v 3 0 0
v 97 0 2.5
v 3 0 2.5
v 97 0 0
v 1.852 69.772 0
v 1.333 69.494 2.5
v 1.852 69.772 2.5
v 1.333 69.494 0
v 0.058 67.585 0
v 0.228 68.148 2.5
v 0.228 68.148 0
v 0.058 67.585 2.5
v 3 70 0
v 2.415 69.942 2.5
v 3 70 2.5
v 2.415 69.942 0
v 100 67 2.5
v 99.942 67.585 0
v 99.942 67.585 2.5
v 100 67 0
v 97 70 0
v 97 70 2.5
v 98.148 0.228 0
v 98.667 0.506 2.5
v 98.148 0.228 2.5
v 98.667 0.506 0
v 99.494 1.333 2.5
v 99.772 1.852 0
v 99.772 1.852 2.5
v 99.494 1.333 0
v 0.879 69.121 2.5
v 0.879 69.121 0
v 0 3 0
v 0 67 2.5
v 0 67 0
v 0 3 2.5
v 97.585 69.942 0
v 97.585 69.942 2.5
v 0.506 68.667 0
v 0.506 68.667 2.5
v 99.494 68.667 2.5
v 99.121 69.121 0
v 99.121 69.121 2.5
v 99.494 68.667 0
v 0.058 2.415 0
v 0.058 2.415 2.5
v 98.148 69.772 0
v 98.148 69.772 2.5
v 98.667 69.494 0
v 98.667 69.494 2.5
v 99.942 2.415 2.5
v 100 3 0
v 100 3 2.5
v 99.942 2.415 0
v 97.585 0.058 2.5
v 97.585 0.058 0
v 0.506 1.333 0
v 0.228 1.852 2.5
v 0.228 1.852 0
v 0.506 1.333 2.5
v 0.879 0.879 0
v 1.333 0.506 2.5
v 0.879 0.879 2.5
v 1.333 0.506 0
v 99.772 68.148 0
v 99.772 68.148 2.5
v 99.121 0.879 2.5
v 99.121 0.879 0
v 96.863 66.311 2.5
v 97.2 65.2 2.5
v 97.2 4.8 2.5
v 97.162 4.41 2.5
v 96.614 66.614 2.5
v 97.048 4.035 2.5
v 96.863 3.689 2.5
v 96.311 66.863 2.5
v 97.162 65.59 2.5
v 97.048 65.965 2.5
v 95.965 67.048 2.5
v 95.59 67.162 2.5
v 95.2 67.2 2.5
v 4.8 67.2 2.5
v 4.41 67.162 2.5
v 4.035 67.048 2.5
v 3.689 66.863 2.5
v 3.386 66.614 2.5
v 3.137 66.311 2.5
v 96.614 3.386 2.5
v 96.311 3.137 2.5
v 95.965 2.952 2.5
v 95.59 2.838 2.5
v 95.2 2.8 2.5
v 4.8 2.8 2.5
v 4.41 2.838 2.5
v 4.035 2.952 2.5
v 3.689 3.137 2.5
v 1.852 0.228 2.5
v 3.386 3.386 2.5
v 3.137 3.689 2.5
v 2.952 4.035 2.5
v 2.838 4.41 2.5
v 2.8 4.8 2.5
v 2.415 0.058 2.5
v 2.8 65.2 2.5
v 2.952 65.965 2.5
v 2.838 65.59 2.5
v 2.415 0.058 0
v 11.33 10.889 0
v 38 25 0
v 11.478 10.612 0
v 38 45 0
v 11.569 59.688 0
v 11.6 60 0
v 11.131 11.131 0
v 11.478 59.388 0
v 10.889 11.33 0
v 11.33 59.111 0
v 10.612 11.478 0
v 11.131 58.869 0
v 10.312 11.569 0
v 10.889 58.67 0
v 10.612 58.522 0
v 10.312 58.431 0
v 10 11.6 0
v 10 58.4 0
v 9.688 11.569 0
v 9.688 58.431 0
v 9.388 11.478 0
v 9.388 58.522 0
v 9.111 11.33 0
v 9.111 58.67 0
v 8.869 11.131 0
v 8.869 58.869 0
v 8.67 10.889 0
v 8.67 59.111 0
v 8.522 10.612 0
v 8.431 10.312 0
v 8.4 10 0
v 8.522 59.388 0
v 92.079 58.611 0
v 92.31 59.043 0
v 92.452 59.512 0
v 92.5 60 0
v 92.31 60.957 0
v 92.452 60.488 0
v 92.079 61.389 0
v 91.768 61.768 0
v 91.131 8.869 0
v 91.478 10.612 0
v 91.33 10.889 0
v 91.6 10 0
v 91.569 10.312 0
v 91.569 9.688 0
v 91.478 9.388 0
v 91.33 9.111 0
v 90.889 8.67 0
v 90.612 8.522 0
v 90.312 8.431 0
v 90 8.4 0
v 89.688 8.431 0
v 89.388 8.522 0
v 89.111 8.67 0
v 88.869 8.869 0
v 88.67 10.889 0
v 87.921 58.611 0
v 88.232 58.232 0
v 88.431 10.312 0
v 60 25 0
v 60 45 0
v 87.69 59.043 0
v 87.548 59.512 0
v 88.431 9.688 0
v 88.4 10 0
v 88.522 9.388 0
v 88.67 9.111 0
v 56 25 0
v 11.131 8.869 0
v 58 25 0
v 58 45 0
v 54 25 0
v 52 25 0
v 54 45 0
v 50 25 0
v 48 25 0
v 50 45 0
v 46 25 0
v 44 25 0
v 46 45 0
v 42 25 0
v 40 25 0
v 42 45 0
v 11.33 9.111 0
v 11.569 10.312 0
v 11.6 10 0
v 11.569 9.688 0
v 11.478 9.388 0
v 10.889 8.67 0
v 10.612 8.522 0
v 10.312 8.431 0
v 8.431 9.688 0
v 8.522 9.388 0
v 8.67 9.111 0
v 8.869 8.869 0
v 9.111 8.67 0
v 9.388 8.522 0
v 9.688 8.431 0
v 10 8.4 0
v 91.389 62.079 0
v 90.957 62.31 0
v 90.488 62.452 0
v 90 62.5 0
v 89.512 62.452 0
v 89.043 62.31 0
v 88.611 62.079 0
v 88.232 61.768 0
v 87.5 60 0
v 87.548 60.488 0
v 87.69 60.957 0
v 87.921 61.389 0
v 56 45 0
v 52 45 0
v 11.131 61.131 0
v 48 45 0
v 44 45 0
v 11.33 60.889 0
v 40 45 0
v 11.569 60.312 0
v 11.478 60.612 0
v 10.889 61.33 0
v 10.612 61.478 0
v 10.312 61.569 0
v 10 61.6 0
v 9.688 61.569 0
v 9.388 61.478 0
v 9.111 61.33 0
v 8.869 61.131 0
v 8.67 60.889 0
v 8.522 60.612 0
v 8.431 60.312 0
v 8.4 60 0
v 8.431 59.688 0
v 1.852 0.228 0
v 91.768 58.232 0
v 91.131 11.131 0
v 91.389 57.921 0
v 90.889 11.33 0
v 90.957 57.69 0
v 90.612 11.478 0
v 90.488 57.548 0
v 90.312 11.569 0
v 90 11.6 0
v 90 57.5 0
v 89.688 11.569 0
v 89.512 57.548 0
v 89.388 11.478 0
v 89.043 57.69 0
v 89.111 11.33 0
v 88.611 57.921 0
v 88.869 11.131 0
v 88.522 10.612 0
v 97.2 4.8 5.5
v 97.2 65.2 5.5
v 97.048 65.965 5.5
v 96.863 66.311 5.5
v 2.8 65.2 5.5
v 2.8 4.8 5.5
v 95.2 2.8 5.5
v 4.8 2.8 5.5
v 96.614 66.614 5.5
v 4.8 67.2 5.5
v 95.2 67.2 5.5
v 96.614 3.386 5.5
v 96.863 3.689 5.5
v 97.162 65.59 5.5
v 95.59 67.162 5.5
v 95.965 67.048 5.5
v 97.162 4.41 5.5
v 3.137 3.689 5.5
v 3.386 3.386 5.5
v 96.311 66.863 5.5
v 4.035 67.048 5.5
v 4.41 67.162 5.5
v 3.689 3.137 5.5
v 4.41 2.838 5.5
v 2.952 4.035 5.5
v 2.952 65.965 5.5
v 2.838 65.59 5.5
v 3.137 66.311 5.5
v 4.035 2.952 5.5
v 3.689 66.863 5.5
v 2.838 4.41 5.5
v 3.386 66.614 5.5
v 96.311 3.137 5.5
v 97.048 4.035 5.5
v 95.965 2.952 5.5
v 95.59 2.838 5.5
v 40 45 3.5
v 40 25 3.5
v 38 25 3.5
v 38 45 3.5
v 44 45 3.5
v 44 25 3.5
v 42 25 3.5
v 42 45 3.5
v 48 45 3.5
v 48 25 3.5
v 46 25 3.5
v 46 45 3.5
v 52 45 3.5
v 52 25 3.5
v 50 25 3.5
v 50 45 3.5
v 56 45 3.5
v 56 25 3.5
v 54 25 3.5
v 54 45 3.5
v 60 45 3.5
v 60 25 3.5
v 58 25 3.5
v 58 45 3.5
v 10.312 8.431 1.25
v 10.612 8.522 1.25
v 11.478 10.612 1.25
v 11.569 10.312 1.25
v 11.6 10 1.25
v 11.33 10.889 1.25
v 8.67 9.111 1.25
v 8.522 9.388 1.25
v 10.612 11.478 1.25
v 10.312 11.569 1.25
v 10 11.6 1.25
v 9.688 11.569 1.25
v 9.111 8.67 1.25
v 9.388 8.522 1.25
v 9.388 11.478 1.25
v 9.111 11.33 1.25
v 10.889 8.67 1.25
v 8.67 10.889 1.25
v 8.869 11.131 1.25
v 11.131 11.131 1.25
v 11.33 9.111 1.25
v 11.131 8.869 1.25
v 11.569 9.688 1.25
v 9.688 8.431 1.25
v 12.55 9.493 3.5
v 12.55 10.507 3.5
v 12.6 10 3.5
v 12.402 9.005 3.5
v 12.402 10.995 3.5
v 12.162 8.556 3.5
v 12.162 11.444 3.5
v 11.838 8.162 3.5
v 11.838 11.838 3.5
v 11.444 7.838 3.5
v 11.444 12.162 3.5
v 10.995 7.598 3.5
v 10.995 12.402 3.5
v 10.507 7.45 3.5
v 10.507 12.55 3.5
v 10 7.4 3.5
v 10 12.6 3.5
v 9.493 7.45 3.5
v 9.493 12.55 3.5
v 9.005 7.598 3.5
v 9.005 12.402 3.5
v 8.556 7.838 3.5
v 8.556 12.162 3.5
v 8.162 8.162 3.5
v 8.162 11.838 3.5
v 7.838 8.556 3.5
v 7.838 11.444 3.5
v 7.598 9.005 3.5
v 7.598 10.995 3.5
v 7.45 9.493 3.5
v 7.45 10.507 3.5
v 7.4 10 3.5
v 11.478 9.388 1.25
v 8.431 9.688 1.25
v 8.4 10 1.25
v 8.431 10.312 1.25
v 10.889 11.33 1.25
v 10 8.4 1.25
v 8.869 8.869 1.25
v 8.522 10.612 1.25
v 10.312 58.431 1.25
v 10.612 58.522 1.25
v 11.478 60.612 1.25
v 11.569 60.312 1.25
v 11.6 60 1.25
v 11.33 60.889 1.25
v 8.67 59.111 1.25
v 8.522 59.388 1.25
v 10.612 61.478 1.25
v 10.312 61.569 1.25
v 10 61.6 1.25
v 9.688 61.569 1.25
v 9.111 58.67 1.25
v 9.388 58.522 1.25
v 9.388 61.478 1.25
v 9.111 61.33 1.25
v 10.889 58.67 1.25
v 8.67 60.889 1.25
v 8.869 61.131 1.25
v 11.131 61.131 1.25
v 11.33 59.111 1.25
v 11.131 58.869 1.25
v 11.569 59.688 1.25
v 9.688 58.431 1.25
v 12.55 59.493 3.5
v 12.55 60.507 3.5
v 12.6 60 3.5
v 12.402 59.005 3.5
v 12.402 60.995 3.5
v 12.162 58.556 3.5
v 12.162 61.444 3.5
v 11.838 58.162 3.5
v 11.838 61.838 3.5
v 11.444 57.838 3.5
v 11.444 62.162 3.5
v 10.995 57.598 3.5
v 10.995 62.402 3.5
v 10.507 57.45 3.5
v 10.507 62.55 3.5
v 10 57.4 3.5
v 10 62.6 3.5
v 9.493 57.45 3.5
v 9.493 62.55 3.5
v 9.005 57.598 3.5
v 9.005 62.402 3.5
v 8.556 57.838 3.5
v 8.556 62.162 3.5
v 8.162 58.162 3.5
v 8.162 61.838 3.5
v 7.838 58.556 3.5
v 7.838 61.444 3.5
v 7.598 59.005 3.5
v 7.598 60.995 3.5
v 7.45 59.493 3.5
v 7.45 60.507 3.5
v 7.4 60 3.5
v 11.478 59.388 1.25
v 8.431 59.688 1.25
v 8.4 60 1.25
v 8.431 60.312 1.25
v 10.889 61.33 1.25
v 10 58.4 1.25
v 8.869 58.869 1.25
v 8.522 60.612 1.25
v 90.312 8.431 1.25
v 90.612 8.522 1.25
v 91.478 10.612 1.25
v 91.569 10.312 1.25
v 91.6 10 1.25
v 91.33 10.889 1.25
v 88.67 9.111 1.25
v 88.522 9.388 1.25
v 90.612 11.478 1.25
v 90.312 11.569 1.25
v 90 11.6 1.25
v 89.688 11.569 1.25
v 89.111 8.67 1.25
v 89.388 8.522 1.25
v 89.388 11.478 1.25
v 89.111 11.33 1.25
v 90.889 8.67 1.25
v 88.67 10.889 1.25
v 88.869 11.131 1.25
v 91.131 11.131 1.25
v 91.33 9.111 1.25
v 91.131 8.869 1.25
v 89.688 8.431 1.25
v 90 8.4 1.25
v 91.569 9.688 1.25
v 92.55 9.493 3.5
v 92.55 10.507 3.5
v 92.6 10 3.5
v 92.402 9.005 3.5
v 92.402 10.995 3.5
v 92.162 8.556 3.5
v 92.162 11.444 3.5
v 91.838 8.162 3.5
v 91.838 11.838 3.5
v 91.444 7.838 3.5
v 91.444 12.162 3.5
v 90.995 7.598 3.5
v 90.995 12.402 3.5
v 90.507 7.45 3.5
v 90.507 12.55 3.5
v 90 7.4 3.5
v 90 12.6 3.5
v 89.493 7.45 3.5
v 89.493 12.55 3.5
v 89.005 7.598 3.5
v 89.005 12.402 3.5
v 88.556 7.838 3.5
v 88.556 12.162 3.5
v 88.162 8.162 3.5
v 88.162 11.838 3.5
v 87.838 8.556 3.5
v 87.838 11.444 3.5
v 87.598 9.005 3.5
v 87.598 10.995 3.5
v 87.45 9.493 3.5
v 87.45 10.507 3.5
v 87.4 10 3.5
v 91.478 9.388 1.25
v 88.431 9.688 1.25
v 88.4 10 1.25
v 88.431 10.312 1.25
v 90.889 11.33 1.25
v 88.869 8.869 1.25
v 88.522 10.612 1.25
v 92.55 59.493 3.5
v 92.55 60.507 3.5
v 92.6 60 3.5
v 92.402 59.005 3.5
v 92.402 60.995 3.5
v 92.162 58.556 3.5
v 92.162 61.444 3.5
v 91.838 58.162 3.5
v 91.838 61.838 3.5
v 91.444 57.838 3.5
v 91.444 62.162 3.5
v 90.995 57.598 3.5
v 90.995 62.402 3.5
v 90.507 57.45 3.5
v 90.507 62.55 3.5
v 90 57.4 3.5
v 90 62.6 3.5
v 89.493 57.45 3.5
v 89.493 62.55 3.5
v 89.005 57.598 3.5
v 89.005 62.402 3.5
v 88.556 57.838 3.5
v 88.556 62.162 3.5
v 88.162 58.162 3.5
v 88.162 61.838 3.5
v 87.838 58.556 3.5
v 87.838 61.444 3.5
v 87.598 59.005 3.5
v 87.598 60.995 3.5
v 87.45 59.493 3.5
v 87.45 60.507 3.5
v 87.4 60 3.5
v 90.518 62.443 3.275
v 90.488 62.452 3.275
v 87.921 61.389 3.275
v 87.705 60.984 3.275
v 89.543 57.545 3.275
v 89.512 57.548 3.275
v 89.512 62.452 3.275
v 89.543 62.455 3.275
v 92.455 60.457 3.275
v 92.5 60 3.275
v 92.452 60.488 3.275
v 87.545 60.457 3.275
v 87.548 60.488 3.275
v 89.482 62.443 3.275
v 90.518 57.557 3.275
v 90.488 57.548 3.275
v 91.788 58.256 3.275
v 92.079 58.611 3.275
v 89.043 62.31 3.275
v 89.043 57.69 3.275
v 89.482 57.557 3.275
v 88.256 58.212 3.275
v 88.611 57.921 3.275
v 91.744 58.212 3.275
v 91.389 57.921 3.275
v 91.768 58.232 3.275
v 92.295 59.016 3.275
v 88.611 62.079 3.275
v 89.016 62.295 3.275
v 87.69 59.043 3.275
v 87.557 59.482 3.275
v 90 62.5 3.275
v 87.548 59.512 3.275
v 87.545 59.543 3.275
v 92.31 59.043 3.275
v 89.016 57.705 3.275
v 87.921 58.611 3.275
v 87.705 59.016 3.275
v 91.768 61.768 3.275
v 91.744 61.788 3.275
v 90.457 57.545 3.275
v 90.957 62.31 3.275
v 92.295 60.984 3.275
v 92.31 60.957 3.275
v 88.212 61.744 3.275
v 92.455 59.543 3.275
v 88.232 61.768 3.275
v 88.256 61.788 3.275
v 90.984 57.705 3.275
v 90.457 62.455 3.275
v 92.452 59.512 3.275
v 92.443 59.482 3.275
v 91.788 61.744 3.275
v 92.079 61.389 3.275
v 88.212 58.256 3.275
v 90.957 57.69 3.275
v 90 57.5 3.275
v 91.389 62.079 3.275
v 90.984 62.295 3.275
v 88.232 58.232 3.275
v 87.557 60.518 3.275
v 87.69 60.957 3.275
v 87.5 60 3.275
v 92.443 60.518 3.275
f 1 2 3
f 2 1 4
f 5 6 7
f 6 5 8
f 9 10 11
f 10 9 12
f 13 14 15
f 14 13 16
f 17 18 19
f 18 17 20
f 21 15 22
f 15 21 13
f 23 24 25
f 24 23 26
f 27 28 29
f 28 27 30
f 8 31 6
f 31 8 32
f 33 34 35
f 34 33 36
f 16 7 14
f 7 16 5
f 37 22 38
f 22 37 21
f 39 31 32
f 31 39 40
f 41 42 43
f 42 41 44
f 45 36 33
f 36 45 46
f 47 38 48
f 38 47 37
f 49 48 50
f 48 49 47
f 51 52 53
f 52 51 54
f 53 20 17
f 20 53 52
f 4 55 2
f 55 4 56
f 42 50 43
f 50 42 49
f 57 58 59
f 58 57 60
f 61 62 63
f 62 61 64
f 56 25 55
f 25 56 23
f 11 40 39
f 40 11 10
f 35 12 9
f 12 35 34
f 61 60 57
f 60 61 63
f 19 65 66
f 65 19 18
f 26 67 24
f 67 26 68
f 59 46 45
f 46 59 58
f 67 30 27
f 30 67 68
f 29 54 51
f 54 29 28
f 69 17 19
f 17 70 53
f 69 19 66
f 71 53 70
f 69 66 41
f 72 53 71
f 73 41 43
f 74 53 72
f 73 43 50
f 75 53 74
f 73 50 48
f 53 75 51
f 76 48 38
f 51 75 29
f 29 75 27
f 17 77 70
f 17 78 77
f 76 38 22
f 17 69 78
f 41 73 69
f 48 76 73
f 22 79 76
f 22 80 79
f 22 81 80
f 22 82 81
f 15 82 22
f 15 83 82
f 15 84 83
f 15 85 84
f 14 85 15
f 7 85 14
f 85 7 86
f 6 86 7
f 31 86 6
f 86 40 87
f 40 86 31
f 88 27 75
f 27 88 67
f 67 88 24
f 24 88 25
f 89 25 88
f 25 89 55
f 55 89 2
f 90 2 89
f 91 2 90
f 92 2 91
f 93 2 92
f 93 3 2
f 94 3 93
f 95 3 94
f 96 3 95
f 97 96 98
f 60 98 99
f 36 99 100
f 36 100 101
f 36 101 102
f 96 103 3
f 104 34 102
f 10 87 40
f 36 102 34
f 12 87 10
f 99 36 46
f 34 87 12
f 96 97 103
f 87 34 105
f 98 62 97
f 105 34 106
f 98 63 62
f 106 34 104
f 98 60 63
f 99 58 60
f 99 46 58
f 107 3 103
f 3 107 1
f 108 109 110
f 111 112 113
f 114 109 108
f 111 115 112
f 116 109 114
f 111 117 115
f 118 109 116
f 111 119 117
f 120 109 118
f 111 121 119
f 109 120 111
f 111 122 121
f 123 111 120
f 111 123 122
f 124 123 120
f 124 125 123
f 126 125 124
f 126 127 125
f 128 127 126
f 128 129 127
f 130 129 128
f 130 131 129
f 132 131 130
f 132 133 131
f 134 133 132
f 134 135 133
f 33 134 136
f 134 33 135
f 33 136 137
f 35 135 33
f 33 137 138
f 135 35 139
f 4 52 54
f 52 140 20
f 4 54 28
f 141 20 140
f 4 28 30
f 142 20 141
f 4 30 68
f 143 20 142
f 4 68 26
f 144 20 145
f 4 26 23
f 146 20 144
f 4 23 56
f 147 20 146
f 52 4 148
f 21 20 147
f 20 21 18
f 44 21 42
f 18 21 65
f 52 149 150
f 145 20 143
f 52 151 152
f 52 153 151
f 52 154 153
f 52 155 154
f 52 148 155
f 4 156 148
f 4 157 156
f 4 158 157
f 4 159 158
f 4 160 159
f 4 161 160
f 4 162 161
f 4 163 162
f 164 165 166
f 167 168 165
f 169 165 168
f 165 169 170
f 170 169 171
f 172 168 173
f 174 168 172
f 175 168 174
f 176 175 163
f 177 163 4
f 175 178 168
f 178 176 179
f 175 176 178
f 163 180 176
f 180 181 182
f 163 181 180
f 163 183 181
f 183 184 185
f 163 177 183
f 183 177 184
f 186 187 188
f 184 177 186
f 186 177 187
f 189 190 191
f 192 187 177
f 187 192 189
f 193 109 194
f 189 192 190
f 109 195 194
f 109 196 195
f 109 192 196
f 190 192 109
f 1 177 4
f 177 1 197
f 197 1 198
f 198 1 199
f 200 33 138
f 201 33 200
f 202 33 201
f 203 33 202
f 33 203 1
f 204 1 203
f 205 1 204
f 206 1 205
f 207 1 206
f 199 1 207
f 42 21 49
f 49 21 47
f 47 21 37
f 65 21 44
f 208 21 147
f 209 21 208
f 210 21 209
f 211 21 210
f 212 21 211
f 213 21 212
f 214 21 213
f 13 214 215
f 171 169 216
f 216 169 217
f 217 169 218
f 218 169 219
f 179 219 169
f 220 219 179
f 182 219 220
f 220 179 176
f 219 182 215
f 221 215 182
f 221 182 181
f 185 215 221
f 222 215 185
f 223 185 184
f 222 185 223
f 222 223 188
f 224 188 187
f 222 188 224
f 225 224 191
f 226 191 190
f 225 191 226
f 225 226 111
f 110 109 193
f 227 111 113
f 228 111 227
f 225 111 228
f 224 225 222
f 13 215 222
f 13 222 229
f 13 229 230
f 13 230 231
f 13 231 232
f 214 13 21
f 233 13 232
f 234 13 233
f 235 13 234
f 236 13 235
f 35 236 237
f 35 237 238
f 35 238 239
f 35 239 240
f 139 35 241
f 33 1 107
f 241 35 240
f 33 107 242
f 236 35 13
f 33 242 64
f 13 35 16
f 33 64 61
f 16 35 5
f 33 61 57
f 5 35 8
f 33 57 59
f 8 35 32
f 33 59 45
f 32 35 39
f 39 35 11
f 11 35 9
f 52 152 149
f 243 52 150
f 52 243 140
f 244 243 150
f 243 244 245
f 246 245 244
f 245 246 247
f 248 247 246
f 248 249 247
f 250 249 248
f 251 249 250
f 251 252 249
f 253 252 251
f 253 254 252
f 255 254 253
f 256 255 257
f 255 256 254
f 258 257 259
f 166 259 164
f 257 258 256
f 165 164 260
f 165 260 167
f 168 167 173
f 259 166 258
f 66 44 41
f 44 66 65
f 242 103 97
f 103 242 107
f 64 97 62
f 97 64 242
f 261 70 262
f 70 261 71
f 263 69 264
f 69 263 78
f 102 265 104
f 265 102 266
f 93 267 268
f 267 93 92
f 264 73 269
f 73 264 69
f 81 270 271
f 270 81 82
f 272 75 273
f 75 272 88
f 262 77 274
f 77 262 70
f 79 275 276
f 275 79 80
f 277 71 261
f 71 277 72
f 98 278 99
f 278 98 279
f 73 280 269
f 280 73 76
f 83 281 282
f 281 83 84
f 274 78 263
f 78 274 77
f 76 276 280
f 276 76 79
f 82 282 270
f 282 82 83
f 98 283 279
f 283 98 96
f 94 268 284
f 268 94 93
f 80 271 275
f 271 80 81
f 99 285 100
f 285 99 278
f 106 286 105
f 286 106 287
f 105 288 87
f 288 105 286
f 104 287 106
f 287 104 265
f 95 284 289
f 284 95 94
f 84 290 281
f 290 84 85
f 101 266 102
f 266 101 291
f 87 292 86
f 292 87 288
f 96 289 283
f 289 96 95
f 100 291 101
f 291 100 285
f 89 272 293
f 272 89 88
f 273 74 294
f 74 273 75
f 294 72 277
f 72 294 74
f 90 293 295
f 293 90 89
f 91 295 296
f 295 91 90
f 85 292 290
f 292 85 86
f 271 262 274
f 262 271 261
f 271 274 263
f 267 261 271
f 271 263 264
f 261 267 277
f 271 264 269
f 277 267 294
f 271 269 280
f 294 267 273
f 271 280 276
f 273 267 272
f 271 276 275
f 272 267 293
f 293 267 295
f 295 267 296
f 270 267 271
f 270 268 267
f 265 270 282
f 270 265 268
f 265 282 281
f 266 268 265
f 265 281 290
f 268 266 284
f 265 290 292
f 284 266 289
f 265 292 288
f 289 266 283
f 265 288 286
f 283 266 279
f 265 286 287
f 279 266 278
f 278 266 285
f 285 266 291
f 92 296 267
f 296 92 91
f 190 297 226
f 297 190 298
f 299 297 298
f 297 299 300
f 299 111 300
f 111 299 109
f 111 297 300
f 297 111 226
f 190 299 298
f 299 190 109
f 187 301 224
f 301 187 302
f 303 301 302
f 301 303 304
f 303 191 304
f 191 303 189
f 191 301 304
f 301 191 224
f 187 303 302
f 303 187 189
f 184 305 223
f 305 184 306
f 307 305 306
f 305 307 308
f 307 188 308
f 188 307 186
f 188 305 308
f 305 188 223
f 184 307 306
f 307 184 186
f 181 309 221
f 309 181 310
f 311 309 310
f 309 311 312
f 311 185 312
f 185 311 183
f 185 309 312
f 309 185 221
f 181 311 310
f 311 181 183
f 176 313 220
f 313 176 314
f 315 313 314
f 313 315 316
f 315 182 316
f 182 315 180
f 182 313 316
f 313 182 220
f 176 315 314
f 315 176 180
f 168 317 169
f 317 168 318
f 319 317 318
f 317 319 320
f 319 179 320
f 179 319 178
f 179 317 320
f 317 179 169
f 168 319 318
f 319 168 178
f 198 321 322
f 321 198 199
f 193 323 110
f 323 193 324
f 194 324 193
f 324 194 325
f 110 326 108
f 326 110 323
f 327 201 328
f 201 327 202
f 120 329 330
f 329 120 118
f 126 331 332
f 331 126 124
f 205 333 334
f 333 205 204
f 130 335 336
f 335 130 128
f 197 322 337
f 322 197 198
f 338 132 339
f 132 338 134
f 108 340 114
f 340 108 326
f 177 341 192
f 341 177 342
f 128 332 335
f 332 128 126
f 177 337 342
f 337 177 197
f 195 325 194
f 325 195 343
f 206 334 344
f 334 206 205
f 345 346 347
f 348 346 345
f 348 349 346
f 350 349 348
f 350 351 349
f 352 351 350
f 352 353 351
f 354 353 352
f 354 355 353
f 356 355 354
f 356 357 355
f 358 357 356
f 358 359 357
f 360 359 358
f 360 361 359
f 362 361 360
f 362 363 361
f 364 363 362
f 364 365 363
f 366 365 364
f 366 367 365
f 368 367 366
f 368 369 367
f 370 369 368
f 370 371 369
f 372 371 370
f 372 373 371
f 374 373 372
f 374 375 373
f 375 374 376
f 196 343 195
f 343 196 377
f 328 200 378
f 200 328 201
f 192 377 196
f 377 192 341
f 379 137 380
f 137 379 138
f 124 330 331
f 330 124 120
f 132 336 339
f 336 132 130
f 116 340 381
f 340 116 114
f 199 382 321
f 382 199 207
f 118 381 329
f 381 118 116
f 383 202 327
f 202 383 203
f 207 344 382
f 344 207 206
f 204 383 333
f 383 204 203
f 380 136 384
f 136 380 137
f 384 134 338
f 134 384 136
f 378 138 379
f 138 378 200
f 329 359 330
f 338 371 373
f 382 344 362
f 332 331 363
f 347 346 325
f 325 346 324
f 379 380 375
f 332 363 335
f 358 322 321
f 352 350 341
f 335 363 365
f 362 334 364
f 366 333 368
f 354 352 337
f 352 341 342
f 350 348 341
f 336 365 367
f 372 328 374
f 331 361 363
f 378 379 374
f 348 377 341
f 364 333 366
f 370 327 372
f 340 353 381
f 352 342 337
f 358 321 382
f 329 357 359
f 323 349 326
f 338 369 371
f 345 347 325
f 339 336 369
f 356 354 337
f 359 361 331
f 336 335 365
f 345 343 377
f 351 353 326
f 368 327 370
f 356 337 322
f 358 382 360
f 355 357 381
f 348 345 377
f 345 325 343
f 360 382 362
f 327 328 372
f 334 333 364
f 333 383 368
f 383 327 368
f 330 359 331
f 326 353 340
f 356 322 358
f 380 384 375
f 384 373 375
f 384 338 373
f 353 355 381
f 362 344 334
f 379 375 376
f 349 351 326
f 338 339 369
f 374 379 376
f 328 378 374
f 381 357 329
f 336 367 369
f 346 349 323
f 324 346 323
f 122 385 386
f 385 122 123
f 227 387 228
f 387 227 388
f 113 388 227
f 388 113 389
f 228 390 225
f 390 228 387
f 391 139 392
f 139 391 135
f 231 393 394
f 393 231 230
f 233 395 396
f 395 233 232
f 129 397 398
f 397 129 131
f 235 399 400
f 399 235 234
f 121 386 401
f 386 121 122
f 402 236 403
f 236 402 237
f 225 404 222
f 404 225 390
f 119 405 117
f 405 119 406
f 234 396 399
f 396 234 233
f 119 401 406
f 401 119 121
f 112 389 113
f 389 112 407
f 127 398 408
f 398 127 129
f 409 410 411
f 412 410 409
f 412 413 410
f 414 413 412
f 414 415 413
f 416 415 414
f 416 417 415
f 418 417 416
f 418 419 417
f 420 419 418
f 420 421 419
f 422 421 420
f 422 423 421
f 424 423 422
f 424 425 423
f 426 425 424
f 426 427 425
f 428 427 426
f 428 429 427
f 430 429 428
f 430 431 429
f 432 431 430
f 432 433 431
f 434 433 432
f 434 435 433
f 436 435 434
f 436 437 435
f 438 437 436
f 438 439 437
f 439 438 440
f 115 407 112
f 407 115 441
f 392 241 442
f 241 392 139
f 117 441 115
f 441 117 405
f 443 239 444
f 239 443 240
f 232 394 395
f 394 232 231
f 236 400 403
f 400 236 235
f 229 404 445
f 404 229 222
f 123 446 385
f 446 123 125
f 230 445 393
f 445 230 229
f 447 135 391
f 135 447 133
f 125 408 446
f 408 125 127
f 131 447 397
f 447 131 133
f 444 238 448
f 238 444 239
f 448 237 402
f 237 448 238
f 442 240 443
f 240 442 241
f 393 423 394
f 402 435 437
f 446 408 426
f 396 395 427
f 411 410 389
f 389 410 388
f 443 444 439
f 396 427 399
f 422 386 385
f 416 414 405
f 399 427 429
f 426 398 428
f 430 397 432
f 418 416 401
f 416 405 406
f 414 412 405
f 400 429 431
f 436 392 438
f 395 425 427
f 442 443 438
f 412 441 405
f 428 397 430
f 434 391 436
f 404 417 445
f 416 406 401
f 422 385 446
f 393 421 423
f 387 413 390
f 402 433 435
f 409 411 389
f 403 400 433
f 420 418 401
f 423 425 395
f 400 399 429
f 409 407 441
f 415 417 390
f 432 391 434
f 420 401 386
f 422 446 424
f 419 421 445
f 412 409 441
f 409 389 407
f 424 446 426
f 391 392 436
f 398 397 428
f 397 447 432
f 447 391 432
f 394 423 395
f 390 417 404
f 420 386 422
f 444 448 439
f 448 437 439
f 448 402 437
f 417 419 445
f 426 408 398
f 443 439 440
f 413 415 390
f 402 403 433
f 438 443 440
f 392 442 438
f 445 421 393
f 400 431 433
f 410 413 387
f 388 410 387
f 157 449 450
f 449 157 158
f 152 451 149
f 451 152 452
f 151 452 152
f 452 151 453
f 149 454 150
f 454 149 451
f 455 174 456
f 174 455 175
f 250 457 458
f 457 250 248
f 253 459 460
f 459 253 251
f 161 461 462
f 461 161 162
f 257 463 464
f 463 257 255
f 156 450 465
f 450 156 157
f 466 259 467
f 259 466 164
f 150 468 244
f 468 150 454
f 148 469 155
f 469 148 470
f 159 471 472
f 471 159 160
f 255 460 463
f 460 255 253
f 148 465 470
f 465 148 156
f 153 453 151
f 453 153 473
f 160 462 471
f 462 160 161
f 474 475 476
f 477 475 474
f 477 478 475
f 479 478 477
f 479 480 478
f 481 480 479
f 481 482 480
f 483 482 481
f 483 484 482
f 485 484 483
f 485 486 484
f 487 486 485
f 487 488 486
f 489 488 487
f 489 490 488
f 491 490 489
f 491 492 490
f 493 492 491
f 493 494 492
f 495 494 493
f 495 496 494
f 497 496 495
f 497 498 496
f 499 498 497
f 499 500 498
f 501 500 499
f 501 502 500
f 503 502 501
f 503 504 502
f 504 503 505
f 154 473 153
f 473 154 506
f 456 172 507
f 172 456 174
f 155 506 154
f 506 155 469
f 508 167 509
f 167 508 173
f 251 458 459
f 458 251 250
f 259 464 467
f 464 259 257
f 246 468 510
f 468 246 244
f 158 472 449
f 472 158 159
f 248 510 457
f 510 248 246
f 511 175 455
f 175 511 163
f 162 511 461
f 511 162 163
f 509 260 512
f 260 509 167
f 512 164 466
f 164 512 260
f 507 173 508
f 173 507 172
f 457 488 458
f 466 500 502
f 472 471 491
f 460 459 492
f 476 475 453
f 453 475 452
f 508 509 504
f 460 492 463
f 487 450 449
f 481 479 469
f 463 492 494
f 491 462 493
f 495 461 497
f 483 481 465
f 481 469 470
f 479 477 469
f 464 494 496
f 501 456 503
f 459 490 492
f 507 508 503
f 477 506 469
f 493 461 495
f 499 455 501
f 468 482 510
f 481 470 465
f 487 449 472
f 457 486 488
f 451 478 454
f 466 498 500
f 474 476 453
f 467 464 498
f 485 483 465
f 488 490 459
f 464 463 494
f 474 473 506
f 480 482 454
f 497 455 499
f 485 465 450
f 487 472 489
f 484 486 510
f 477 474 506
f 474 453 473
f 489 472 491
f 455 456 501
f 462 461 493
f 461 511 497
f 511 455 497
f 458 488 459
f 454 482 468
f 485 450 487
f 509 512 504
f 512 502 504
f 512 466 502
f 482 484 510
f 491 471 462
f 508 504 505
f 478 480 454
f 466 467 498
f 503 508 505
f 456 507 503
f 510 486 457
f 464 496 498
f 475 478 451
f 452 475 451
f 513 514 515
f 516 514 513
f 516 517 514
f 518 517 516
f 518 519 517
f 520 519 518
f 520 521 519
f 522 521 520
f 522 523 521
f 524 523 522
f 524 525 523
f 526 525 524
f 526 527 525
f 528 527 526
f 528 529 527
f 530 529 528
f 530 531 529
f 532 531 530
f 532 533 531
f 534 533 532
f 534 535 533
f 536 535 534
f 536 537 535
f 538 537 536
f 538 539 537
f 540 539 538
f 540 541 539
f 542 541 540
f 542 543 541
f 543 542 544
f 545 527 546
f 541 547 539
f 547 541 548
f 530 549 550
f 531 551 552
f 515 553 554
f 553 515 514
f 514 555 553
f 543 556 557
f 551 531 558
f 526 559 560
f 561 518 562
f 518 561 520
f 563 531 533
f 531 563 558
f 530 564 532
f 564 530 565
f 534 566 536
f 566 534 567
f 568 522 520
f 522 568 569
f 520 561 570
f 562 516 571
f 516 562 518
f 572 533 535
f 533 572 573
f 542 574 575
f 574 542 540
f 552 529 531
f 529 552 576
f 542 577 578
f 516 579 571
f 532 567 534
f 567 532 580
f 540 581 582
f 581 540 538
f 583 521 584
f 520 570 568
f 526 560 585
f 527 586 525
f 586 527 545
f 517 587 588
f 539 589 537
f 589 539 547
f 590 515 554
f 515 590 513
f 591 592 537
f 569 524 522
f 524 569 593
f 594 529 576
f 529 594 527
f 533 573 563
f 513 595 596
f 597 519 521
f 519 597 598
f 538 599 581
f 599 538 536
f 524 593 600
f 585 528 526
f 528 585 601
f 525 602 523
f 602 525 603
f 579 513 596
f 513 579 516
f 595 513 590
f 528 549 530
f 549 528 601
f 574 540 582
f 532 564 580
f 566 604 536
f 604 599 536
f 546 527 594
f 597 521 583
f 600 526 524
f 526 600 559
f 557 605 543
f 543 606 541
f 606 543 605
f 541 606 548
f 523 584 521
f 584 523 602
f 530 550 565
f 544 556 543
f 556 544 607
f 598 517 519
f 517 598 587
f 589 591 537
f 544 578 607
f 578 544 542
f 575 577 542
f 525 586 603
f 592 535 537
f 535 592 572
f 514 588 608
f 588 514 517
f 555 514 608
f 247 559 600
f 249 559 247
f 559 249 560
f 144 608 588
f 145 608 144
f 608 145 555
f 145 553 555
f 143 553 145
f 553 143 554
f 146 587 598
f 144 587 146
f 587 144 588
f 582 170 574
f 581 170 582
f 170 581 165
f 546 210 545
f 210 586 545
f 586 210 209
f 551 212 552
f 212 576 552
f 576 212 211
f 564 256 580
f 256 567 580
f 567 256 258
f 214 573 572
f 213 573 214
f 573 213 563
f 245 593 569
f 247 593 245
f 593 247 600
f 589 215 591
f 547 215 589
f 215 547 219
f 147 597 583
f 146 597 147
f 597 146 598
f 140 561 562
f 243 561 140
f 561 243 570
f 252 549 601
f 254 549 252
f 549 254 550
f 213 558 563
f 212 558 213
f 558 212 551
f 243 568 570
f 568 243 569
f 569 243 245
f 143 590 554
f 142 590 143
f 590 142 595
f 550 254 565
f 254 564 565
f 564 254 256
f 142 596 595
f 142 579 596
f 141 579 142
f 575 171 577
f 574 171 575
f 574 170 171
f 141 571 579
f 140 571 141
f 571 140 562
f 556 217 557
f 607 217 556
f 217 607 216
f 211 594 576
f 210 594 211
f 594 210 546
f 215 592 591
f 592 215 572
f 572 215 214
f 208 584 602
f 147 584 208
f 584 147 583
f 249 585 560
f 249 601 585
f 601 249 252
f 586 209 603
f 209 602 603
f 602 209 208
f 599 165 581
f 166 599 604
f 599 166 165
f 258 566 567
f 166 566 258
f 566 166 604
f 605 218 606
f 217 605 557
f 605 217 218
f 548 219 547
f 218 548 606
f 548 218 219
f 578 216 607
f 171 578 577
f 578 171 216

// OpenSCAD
/*
 * ESP32 Battery Monitor Enclosure - LID PART
 * 
 * OpenSCAD script to generate 3D printable enclosure lid
 * 
 * To use:
 * 1. Install OpenSCAD (free): https://openscad.org/
 * 2. Open this file in OpenSCAD
 * 3. Press F5 to preview
 * 4. Press F6 to render
 * 5. File > Export > Export as STL
 * 
 * Print settings:
 * - Layer height: 0.2mm
 * - Infill: 20%
 * - Supports: No
 * - Material: PLA or PETG
 */

// ============================================================================
// Configuration Parameters (adjust as needed)
// ============================================================================

// Box dimensions (in mm) - MUST MATCH BOTTOM PART
box_length = 100;      // X dimension
box_width = 70;        // Y dimension
box_height = 40;       // Z dimension (total height)
wall_thickness = 2.5;  // Wall thickness

// Lid
lid_lip_height = 3;    // Overlap between lid and box
lid_gap = 0.3;         // Clearance gap

// Ventilation
vent_slot_width = 2;
vent_slot_length = 20;
vent_slot_spacing = 4;

// Mounting
mounting_hole_diameter = 3.2;  // M3 screw holes

// Rounded corners
corner_radius = 3;

// ============================================================================
// Calculated Values
// ============================================================================

inner_length = box_length - 2 * wall_thickness;
inner_width = box_width - 2 * wall_thickness;

// ============================================================================
// Modules
// ============================================================================

// Rounded box module
module rounded_box(length, width, height, radius) {
    hull() {
        translate([radius, radius, 0])
            cylinder(r=radius, h=height, $fn=32);
        translate([length-radius, radius, 0])
            cylinder(r=radius, h=height, $fn=32);
        translate([radius, width-radius, 0])
            cylinder(r=radius, h=height, $fn=32);
        translate([length-radius, width-radius, 0])
            cylinder(r=radius, h=height, $fn=32);
    }
}

// Lid (top part)
module enclosure_lid() {
    difference() {
        union() {
            // Main lid
            rounded_box(box_length, box_width, wall_thickness, corner_radius);
            
            // Lip that fits inside box
            translate([wall_thickness + lid_gap, wall_thickness + lid_gap, wall_thickness])
                rounded_box(
                    inner_length - 2*lid_gap, 
                    inner_width - 2*lid_gap, 
                    lid_lip_height, 
                    corner_radius-1
                );
        }
        
        // Ventilation slots
        for(i = [0:5]) {
            translate([box_length/2 - 3*vent_slot_spacing + i*vent_slot_spacing, 
                      box_width/2 - vent_slot_length/2, 
                      -1])
                cube([vent_slot_width, vent_slot_length, wall_thickness+2]);
        }
        
        // LED indicator hole (if you add one)
        translate([box_length - 10, box_width - 10, -1])
            cylinder(d=5, h=wall_thickness+2, $fn=32);
        
        // Mounting screw holes for lid
        for(x = [10, box_length-10]) {
            for(y = [10, box_width-10]) {
                translate([x, y, -1])
                    cylinder(d=mounting_hole_diameter, h=wall_thickness+2, $fn=32);
                // Countersink
                translate([x, y, wall_thickness/2])
                    cylinder(d1=mounting_hole_diameter, d2=mounting_hole_diameter+2, h=wall_thickness/2+1, $fn=32);
            }
        }
    }
}

// ============================================================================
// Generate Lid Part
// ============================================================================

enclosure_lid();

// ============================================================================
// Print Instructions
// ============================================================================

/*
TO EXPORT STL FILE:
1. F6 to render (may take a few seconds)
2. File > Export > Export as STL
3. Save as: battery_monitor_lid.stl

3D PRINTING SETTINGS:
- Layer height: 0.2mm
- Shell thickness: 3 perimeters (1.2mm)
- Infill: 20%
- Supports: No (prints flat)
- Bed adhesion: Brim optional
- Material: PLA or PETG (match bottom part)
- Print time: ~1-1.5 hours

POST-PROCESSING:
- Remove any brim or support material
- Clean mounting screw holes if needed
- Verify ventilation slots are clear
- Test fit on bottom part before assembly

ASSEMBLY:
1. Ensure all components are installed in bottom part
2. Test functionality with lid open
3. Place lid on top of bottom part
4. Verify lip fits inside bottom part
5. Secure with M3 x 10mm screws through mounting holes (optional)
6. For permanent seal, can use small amount of adhesive

CUSTOMIZATION:
Adjust parameters at top of file:
- IMPORTANT: Dimensions must match bottom part!
- lid_gap: Increase for looser fit, decrease for tighter fit
- vent_slot_width/length: Adjust ventilation
- lid_lip_height: Change snap-fit depth
*/
